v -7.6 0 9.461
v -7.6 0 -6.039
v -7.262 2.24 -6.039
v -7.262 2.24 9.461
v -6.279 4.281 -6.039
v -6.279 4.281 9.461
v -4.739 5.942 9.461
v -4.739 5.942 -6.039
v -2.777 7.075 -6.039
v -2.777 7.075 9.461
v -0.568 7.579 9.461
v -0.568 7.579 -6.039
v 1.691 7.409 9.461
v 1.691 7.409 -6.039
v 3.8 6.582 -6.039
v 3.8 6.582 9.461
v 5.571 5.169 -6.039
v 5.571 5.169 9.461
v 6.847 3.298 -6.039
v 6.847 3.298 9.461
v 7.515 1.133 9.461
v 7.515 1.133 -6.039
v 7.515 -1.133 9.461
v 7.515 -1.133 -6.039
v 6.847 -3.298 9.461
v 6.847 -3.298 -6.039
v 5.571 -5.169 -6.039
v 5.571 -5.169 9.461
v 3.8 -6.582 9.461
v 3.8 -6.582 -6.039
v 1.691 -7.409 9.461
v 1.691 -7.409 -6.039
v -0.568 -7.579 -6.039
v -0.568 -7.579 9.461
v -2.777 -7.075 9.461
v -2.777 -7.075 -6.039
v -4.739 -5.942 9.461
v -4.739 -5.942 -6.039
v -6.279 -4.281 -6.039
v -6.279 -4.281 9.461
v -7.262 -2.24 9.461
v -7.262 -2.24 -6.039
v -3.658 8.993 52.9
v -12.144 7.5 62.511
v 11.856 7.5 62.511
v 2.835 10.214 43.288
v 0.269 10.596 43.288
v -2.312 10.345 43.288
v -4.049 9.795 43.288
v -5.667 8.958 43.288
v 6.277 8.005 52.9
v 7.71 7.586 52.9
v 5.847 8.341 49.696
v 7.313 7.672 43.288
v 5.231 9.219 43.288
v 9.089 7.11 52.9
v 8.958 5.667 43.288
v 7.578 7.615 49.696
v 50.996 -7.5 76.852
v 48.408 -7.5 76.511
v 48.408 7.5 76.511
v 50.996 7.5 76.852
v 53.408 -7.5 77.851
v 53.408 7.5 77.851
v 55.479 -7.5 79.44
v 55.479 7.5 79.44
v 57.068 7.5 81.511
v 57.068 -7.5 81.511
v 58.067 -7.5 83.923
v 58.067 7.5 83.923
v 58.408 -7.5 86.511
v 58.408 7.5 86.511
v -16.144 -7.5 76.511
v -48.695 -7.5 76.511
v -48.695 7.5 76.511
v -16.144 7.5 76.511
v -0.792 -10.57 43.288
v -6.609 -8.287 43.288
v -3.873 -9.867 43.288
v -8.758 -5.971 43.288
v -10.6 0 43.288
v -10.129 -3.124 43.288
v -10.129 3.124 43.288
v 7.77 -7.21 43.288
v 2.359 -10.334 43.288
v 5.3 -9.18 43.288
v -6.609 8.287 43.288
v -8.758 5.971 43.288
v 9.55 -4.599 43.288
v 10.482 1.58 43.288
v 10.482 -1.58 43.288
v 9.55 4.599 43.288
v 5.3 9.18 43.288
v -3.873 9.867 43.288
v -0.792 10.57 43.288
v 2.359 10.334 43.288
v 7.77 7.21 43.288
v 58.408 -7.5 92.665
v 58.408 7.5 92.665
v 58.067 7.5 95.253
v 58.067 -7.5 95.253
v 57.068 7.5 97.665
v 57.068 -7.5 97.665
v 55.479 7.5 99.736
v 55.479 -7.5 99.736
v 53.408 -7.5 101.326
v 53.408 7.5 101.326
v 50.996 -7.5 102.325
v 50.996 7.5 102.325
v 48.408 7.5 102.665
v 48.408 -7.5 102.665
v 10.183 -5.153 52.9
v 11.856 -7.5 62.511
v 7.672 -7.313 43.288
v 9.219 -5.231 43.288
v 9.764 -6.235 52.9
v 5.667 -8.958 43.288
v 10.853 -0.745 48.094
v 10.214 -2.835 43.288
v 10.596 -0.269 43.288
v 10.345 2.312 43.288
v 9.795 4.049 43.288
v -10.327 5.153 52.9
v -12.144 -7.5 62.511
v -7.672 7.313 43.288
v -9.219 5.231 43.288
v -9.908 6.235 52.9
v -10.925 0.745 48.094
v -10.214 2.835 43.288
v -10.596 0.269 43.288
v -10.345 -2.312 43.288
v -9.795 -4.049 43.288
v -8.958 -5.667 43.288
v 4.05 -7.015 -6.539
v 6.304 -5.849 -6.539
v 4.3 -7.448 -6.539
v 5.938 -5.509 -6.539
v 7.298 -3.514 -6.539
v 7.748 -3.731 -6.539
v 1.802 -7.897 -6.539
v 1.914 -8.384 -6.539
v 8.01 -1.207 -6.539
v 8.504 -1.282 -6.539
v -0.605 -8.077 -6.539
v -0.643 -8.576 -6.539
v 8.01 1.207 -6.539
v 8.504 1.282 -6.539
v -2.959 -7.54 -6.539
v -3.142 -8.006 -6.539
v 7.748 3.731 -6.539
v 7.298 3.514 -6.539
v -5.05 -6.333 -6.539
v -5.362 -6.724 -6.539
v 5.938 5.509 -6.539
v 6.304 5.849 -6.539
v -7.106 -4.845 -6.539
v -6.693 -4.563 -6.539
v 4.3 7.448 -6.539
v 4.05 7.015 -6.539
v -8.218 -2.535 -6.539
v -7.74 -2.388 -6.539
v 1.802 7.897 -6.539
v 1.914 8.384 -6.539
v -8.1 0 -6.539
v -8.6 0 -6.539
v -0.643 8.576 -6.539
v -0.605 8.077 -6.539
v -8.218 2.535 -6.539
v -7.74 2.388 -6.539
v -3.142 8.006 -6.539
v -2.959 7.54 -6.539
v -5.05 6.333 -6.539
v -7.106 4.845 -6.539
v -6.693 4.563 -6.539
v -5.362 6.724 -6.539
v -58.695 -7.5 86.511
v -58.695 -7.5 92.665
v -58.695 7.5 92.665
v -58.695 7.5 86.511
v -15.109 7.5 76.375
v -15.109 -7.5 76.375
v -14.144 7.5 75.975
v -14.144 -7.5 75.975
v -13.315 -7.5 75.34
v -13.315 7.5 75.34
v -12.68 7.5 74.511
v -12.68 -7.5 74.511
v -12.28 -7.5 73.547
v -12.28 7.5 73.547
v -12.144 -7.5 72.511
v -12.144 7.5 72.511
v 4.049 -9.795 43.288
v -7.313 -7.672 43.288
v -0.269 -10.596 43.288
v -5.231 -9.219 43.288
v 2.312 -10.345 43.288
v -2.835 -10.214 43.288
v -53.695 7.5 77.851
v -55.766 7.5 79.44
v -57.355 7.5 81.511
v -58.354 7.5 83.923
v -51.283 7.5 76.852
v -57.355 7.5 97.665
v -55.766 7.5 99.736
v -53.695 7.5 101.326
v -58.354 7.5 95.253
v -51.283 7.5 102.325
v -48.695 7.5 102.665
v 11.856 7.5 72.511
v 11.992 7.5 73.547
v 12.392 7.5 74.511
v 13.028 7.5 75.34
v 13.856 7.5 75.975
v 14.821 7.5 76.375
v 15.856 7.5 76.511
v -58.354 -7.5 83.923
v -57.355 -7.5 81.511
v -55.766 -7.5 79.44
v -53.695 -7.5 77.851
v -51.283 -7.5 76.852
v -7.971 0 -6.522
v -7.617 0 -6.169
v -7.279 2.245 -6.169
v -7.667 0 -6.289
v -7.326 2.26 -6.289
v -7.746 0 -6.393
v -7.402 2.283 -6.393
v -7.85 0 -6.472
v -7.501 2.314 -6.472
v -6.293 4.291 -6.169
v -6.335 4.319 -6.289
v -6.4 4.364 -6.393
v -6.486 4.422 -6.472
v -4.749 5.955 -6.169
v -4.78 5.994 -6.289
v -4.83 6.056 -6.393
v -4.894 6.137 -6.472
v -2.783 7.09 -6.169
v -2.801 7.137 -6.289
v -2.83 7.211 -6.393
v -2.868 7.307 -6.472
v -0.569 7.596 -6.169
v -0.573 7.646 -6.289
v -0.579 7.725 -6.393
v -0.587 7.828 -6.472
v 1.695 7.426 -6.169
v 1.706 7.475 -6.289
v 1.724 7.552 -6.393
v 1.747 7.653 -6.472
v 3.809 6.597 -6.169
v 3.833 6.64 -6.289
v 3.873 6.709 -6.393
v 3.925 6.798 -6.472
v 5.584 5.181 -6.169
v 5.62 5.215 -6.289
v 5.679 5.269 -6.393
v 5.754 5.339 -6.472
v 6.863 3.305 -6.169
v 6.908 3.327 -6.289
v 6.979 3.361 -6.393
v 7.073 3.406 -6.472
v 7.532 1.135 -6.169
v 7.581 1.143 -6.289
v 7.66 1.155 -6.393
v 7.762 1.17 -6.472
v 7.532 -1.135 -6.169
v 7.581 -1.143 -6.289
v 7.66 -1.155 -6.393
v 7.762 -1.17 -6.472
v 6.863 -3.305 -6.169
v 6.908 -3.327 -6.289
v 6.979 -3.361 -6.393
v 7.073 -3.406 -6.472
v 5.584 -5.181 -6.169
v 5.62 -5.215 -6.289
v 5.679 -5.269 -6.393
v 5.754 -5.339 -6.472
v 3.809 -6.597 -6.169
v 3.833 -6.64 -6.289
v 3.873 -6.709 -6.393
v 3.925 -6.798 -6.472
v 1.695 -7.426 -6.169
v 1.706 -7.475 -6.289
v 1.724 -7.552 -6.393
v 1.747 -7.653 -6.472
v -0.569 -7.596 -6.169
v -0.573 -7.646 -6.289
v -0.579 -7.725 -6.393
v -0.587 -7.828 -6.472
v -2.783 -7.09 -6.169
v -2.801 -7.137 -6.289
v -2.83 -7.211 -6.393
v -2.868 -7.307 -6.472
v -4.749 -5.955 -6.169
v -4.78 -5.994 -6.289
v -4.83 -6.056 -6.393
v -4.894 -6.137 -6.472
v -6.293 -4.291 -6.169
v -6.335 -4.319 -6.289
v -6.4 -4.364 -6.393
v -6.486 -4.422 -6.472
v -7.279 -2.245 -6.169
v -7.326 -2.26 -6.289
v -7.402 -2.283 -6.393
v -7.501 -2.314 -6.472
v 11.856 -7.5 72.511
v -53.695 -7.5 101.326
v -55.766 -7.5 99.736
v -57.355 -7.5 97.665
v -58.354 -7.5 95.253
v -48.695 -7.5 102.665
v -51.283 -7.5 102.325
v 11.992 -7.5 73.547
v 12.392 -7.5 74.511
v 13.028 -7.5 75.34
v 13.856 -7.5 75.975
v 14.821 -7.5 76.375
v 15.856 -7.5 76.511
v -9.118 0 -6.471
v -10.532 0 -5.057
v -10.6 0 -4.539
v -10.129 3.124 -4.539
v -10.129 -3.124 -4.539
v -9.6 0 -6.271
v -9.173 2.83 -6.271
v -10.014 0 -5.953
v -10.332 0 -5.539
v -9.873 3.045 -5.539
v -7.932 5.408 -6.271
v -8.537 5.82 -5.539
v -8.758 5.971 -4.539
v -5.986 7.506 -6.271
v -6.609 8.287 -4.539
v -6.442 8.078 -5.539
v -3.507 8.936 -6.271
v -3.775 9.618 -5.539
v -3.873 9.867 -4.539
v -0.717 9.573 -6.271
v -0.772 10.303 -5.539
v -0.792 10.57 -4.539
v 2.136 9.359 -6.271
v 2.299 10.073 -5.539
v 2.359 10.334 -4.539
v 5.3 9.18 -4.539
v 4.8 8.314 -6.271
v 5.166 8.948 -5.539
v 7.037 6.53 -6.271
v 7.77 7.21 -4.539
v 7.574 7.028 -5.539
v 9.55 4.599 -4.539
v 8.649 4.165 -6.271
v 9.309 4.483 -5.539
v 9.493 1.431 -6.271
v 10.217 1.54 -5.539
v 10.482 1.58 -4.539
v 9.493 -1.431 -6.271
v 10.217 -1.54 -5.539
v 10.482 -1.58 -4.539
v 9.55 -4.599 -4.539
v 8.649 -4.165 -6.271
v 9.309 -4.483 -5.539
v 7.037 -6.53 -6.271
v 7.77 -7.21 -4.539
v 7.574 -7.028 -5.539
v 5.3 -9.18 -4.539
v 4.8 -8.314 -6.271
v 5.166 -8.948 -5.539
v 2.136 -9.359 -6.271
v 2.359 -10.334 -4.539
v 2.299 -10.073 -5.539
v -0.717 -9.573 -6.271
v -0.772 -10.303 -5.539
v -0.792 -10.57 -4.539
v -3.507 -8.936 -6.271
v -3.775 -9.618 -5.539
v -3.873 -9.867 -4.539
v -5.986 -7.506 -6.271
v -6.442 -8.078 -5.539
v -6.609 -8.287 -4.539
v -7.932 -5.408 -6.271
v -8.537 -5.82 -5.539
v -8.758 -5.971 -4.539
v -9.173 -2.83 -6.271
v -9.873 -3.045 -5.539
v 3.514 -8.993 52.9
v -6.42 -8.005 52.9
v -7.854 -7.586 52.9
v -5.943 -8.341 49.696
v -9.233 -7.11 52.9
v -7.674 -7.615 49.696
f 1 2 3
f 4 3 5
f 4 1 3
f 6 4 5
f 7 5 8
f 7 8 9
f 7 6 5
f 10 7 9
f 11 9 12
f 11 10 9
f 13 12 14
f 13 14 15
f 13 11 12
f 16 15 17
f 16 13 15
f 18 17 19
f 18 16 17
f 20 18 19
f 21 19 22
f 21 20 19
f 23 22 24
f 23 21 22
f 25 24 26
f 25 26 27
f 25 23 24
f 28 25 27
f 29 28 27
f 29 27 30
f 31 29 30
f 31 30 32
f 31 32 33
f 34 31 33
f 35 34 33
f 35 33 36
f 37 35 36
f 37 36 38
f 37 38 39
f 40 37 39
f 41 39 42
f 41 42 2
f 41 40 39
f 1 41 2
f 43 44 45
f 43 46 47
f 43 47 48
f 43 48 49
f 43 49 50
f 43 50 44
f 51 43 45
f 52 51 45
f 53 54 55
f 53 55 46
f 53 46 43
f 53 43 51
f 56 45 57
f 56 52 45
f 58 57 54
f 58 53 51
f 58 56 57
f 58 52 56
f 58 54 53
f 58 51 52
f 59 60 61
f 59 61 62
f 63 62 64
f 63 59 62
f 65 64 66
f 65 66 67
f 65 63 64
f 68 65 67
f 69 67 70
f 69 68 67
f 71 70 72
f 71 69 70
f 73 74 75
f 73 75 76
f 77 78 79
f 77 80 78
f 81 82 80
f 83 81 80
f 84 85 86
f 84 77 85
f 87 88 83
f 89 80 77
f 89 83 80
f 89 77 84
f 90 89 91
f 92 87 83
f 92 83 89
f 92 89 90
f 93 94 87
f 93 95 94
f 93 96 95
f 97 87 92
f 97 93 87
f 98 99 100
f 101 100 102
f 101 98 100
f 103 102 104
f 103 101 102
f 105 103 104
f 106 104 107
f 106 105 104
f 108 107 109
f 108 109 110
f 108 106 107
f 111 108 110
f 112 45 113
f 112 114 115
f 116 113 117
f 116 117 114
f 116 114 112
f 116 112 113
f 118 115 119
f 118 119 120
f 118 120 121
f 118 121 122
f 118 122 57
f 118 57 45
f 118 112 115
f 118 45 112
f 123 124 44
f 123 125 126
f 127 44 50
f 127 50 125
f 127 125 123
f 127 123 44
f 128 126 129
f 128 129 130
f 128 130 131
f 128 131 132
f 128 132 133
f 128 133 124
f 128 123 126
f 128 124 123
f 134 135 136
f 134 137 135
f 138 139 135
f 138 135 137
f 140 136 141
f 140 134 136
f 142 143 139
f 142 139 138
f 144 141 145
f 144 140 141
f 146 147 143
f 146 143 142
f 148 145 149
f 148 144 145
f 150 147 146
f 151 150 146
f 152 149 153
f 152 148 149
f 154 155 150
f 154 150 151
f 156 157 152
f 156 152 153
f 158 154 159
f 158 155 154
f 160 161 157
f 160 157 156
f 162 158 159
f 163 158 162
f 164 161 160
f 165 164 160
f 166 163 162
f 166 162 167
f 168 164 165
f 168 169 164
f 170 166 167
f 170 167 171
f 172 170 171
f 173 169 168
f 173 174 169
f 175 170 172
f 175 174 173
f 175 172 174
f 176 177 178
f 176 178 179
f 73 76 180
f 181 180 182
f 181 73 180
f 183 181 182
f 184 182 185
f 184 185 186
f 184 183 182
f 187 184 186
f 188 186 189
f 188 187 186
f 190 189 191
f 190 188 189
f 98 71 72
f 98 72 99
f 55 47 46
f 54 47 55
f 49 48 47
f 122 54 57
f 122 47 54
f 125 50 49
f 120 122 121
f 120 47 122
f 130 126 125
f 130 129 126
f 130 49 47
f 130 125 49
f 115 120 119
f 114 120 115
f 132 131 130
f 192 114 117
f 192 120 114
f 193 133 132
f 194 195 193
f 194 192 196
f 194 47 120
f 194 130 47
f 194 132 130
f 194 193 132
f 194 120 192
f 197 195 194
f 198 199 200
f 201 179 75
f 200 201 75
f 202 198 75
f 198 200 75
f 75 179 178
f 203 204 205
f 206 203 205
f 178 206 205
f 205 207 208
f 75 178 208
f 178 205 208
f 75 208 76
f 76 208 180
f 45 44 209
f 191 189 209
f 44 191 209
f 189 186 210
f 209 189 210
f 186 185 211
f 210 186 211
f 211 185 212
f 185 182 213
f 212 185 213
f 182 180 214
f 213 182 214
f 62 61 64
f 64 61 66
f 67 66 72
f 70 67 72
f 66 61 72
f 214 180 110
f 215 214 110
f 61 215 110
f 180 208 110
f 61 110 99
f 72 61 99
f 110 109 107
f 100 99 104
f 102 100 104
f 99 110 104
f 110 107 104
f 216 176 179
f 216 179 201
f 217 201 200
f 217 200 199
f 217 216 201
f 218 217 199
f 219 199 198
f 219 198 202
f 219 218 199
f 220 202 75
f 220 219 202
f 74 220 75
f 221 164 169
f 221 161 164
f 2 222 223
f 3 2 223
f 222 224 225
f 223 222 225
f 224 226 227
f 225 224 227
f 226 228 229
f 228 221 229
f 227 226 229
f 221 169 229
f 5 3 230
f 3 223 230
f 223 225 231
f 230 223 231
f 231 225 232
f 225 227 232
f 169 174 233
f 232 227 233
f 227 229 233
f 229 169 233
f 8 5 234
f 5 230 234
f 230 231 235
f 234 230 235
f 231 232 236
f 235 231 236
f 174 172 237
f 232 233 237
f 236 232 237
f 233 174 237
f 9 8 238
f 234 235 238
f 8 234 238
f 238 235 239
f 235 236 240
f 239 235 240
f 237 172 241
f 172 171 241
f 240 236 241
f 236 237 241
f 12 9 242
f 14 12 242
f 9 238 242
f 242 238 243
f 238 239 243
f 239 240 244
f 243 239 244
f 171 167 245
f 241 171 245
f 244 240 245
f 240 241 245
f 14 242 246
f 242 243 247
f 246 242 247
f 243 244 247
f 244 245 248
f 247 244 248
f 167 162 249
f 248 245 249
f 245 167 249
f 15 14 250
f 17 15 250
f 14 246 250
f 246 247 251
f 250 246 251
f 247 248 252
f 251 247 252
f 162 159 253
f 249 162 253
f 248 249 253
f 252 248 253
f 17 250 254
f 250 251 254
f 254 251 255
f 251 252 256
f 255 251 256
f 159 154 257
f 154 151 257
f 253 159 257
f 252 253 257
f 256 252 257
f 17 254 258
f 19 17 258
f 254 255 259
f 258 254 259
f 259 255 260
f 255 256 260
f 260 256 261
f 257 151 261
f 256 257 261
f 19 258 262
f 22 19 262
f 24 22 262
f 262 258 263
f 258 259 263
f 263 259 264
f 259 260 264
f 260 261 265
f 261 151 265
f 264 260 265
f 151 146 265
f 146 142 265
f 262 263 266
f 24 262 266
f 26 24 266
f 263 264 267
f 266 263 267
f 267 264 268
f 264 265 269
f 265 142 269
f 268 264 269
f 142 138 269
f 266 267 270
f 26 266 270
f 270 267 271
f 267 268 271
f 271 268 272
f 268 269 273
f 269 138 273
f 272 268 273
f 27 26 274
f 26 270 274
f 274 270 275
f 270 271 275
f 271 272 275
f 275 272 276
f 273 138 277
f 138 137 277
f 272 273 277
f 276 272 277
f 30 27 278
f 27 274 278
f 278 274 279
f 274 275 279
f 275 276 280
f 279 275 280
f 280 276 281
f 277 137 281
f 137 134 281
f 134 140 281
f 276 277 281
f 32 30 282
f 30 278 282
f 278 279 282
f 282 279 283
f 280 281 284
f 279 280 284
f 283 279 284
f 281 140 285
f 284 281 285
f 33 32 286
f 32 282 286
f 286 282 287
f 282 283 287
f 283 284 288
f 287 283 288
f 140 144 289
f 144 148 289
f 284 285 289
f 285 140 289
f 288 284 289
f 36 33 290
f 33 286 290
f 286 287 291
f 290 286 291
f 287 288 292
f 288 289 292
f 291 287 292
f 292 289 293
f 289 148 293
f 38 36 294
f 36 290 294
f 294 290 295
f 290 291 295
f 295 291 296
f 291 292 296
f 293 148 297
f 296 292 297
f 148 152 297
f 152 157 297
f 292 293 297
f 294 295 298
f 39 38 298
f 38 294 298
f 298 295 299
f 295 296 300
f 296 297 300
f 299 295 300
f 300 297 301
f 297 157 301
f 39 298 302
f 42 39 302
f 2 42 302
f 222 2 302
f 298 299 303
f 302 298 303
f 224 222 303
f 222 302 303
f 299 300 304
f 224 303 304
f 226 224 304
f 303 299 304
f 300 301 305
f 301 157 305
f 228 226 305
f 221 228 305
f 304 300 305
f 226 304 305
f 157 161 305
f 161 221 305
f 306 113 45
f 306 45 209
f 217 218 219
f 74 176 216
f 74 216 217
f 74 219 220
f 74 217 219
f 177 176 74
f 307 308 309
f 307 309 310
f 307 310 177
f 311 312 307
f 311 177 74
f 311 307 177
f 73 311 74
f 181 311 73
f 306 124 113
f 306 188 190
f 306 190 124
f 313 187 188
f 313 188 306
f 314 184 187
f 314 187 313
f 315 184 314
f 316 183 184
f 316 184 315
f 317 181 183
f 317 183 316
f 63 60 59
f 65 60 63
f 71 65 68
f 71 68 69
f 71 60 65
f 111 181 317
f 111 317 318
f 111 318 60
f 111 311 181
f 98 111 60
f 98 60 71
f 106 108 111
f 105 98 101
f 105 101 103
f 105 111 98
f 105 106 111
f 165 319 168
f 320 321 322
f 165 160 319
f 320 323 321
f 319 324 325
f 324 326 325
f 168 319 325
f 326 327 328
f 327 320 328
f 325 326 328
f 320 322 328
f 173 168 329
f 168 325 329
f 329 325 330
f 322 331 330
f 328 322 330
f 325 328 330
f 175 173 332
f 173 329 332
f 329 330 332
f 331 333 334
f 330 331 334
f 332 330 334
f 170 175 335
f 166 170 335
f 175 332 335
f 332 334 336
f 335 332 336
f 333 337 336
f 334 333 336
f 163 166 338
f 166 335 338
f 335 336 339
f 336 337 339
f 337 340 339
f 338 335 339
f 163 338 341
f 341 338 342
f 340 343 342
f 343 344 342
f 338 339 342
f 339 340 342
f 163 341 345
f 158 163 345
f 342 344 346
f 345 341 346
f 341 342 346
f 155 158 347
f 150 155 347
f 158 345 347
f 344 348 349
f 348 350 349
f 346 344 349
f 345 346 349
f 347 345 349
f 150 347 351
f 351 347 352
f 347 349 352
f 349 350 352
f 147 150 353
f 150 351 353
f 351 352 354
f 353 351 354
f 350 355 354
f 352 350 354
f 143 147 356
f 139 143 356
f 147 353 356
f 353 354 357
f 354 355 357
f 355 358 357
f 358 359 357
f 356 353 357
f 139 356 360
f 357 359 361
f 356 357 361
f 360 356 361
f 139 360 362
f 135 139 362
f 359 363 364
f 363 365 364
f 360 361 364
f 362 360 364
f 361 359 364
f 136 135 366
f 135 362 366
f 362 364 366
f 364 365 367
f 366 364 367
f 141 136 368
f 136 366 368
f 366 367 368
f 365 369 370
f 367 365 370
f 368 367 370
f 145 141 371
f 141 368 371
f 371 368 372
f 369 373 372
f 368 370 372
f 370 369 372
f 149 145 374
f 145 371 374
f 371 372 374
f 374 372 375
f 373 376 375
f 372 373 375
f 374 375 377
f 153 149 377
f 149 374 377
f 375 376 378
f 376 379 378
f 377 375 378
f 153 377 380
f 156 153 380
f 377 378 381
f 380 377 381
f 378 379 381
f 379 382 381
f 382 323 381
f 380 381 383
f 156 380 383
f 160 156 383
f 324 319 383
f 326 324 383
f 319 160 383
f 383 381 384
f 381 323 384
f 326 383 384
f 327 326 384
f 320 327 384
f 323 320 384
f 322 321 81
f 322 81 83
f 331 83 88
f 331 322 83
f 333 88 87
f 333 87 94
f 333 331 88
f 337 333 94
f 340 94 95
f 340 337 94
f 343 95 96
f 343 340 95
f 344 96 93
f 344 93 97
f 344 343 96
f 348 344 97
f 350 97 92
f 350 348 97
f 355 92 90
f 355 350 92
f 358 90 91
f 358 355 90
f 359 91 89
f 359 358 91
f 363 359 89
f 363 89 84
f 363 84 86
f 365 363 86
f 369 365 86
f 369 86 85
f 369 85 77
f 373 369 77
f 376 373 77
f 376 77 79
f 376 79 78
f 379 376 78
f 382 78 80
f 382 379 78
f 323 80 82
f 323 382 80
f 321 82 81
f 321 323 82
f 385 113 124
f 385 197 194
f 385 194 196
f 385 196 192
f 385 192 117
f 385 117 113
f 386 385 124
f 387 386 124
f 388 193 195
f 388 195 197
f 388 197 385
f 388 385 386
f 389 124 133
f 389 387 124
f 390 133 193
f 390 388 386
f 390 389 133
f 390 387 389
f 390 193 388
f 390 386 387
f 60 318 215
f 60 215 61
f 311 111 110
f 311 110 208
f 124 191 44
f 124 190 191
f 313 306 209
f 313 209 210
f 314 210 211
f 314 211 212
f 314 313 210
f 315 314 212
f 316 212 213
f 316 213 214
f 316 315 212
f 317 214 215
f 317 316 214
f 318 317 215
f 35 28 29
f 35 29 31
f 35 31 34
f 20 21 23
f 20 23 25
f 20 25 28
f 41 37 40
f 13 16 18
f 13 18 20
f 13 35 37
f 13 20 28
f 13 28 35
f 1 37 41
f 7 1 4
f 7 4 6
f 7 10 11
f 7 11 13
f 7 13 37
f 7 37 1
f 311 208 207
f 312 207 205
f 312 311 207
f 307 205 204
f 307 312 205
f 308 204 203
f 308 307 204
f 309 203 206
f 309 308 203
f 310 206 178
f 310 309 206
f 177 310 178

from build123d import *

# Parameters (mm, degrees)
F2_R      = 0.5
F4_DEPTH  = 7.5
F4_FACE_W = 24
F4_FACE_H = 15
F6_R      = 2


# Not quite as in the source:
# - the arcs of a loft's sections are written as splines that run evenly, so that the points pair up as in the source's solid


with BuildPart() as f1:
    # F0 (on Front) → F1 (revolve)
    with BuildSketch(Plane.XZ):
        Polygon((-7.6, -6.539241709), (-7.6, 9.460758291), (0, 9.460758291), (0, 43.2881079614), (-10.6, 43.2881079614), (-10.6, -6.539241709), align=None)
    revolve(axis=Axis((0, 0, 26.3744331262), (0, 0, -1)))

    # F2
    f2_edges = [f1.edges().sort_by_distance(p)[0] for p in [
        (7.6, 0, -6.539242),
    ]]
    fillet(f2_edges, radius=F2_R)

    # F6
    f6_edges = [f1.edges().sort_by_distance(p)[0] for p in [
        (10.6, 0, -6.539242),
        (8.1, 0, -6.539242),
    ]]
    fillet(f6_edges, radius=F6_R)


with BuildPart() as f4:
    # F3 (on Front) → F4 (new body, symmetric)
    with BuildSketch(Plane.XZ):
        with BuildLine():
            Line((-12.1438586622, 62.5112550155), (-0.1438586622, 62.5112550155))
            Line((-0.1438586622, 62.5112550155), (-0.1438586622, 102.6653030368))
            Line((-0.1438586622, 102.6653030368), (-48.6952245638, 102.6653030368))
            ThreePointArc((-48.6952245638, 102.6653030368), (-55.7662923757, 99.7363708486), (-58.6952245638, 92.6653030368))
            Line((-58.6952245638, 92.6653030368), (-58.6952245638, 86.5112550155))
            ThreePointArc((-58.6952245638, 86.5112550155), (-55.7662923757, 79.4401872036), (-48.6952245638, 76.5112550155))
            Line((-48.6952245638, 76.5112550155), (-16.1438586622, 76.5112550155))
            ThreePointArc((-16.1438586622, 76.5112550155), (-13.3154315374, 75.3396821402), (-12.1438586622, 72.5112550155))
            Line((-12.1438586622, 72.5112550155), (-12.1438586622, 62.5112550155))
        make_face()
        with BuildLine():
            Line((-0.1438586622, 102.6653030368), (-0.1438586622, 62.5112550155))
            Line((-0.1438586622, 62.5112550155), (11.8561413378, 62.5112550155))
            Line((11.8561413378, 62.5112550155), (11.8561413378, 72.5112550155))
            ThreePointArc((11.8561413378, 72.5112550155), (13.0277142131, 75.3396821402), (15.8561413378, 76.5112550155))
            Line((15.8561413378, 76.5112550155), (48.4075072394, 76.5112550155))
            ThreePointArc((48.4075072394, 76.5112550155), (55.4785750513, 79.4401872036), (58.4075072394, 86.5112550155))
            Line((58.4075072394, 86.5112550155), (58.4075072394, 92.6653030368))
            ThreePointArc((58.4075072394, 92.6653030368), (55.4785750513, 99.7363708486), (48.4075072394, 102.6653030368))
            Line((48.4075072394, 102.6653030368), (-0.1438586622, 102.6653030368))
        make_face()
    extrude(amount=F4_DEPTH, both=True)

    # F4_face (on face) → F5 section 0
    with BuildSketch(Plane(origin=(-0.1438586622, 0, 62.5112550155), x_dir=(1, 0, 0), z_dir=(0, 0, -1))):
        Rectangle(F4_FACE_W, F4_FACE_H)
    # F1_face (on face) → F5 section 1
    with BuildSketch(Plane.XY.offset(43.2881079614)):
        with BuildLine():
            add(Edge.make_bspline(
                [(8.9581169834, 5.6667574602), (8.2163401664, 6.8393722312), (7.2416993998, 7.8640350998), (4.9735940712, 9.463013276), (3.6810219119, 10.0366994541), (0.9736633644, 10.645996332), (-0.4400577936, 10.6813672994), (-3.1744987633, 10.2082229526), (-4.4941426892, 9.6998938003), (-5.6667574602, 8.9581169834)],
                knots=[0, 0, 0, 0, 0.25, 0.25, 0.5, 0.5, 0.75, 0.75, 1, 1, 1, 1], degree=3))
            add(Edge.make_bspline(
                [(-5.6667574602, 8.9581169834), (-6.8393722312, 8.2163401664), (-7.8640350998, 7.2416993998), (-9.463013276, 4.9735940712), (-10.0366994541, 3.6810219119), (-10.645996332, 0.9736633644), (-10.6813672994, -0.4400577936), (-10.2082229526, -3.1744987633), (-9.6998938003, -4.4941426892), (-8.9581169834, -5.6667574602)],
                knots=[0, 0, 0, 0, 0.25, 0.25, 0.5, 0.5, 0.75, 0.75, 1, 1, 1, 1], degree=3))
            add(Edge.make_bspline(
                [(-8.9581169834, -5.6667574602), (-8.2163401664, -6.8393722312), (-7.2416993998, -7.8640350998), (-4.9735940712, -9.463013276), (-3.6810219119, -10.0366994541), (-0.9736633644, -10.645996332), (0.4400577936, -10.6813672994), (3.1744987633, -10.2082229526), (4.4941426892, -9.6998938003), (5.6667574602, -8.9581169834)],
                knots=[0, 0, 0, 0, 0.25, 0.25, 0.5, 0.5, 0.75, 0.75, 1, 1, 1, 1], degree=3))
            add(Edge.make_bspline(
                [(5.6667574602, -8.9581169834), (6.8393722312, -8.2163401664), (7.8640350998, -7.2416993998), (9.463013276, -4.9735940712), (10.0366994541, -3.6810219119), (10.645996332, -0.9736633644), (10.6813672994, 0.4400577936), (10.2082229526, 3.1744987633), (9.6998938003, 4.4941426892), (8.9581169834, 5.6667574602)],
                knots=[0, 0, 0, 0, 0.25, 0.25, 0.5, 0.5, 0.75, 0.75, 1, 1, 1, 1], degree=3))
        make_face()
    loft(ruled=True)


solid = Compound([f1.part, f4.part])
